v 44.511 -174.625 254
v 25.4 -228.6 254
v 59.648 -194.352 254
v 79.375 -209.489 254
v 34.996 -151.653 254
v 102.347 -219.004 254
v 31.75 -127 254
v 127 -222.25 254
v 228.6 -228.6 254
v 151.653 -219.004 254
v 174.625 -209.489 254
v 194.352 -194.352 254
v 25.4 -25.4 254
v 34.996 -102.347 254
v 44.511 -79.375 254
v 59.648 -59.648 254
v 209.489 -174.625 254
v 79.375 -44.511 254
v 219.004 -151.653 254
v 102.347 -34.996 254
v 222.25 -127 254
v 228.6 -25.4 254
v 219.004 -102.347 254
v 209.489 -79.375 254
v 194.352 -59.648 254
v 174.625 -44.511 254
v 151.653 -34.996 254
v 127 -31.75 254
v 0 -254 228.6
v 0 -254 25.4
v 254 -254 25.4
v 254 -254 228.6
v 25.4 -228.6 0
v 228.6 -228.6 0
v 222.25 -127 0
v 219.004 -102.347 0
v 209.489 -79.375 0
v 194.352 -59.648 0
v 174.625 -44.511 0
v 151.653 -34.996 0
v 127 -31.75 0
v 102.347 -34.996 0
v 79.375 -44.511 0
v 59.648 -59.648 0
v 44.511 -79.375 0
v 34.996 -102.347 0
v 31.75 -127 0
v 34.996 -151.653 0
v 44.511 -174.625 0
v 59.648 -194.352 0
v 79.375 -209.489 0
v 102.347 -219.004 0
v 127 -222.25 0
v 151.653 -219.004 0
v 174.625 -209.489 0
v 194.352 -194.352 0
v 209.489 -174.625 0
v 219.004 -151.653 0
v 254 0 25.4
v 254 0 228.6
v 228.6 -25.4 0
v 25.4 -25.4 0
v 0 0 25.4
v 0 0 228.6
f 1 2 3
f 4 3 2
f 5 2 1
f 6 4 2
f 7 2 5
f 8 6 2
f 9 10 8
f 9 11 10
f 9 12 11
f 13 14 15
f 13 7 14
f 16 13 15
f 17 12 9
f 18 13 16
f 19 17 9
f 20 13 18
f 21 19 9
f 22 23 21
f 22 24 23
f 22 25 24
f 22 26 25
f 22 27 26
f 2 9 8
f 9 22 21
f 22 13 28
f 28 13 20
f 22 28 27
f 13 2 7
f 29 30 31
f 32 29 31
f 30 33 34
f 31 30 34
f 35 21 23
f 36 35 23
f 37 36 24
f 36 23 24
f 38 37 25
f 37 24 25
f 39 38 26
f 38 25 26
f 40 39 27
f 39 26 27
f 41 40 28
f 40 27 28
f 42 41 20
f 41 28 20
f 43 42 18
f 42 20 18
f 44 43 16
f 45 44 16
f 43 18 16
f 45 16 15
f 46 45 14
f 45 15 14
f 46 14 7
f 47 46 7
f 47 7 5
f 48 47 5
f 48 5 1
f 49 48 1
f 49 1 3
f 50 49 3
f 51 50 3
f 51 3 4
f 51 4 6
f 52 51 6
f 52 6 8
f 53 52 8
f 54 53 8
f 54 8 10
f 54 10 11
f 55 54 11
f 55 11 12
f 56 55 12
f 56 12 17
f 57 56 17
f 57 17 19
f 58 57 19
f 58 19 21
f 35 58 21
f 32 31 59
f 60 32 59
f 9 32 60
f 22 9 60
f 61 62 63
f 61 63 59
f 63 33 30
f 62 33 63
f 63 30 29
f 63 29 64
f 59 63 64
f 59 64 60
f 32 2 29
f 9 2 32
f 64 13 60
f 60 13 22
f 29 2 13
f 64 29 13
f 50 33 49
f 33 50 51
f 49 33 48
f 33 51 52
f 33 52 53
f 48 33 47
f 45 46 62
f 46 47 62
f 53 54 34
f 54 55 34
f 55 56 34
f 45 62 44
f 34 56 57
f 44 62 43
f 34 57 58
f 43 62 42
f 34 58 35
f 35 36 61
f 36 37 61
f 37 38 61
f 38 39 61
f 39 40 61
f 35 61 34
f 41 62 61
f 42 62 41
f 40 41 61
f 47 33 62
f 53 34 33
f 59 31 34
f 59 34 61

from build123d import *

# Parameters (mm, degrees)
F0_W     = 254
F0_H     = 254
F1_DEPTH = 254
F2_R     = 95.25
F3_DEPTH = 254.001
F4_SIZE  = 25.4


with BuildPart() as f1:
    # F0 (on Top) → F1 (new body)
    with BuildSketch(Plane.XY):
        with Locations((127, -127)):
            Rectangle(F0_W, F0_H)
    extrude(amount=F1_DEPTH)

    # F2 (on face) → F3 (cut, through all)
    with BuildSketch(Plane.XY.offset(254)):
        with Locations((127, -127)):
            Circle(F2_R)
    extrude(amount=-F3_DEPTH, mode=Mode.SUBTRACT)

    # F4
    f4_edges = [f1.edges().sort_by_distance(p)[0] for p in [
        (127, -254, 254),
        (254, -127, 254),
        (127, 0, 254),
        (0, -127, 254),
        (254, -127, 0),
        (127, -254, 0),
        (127, 0, 0),
        (0, -127, 0),
    ]]
    chamfer(f4_edges, length=F4_SIZE)


solid = f1.part
